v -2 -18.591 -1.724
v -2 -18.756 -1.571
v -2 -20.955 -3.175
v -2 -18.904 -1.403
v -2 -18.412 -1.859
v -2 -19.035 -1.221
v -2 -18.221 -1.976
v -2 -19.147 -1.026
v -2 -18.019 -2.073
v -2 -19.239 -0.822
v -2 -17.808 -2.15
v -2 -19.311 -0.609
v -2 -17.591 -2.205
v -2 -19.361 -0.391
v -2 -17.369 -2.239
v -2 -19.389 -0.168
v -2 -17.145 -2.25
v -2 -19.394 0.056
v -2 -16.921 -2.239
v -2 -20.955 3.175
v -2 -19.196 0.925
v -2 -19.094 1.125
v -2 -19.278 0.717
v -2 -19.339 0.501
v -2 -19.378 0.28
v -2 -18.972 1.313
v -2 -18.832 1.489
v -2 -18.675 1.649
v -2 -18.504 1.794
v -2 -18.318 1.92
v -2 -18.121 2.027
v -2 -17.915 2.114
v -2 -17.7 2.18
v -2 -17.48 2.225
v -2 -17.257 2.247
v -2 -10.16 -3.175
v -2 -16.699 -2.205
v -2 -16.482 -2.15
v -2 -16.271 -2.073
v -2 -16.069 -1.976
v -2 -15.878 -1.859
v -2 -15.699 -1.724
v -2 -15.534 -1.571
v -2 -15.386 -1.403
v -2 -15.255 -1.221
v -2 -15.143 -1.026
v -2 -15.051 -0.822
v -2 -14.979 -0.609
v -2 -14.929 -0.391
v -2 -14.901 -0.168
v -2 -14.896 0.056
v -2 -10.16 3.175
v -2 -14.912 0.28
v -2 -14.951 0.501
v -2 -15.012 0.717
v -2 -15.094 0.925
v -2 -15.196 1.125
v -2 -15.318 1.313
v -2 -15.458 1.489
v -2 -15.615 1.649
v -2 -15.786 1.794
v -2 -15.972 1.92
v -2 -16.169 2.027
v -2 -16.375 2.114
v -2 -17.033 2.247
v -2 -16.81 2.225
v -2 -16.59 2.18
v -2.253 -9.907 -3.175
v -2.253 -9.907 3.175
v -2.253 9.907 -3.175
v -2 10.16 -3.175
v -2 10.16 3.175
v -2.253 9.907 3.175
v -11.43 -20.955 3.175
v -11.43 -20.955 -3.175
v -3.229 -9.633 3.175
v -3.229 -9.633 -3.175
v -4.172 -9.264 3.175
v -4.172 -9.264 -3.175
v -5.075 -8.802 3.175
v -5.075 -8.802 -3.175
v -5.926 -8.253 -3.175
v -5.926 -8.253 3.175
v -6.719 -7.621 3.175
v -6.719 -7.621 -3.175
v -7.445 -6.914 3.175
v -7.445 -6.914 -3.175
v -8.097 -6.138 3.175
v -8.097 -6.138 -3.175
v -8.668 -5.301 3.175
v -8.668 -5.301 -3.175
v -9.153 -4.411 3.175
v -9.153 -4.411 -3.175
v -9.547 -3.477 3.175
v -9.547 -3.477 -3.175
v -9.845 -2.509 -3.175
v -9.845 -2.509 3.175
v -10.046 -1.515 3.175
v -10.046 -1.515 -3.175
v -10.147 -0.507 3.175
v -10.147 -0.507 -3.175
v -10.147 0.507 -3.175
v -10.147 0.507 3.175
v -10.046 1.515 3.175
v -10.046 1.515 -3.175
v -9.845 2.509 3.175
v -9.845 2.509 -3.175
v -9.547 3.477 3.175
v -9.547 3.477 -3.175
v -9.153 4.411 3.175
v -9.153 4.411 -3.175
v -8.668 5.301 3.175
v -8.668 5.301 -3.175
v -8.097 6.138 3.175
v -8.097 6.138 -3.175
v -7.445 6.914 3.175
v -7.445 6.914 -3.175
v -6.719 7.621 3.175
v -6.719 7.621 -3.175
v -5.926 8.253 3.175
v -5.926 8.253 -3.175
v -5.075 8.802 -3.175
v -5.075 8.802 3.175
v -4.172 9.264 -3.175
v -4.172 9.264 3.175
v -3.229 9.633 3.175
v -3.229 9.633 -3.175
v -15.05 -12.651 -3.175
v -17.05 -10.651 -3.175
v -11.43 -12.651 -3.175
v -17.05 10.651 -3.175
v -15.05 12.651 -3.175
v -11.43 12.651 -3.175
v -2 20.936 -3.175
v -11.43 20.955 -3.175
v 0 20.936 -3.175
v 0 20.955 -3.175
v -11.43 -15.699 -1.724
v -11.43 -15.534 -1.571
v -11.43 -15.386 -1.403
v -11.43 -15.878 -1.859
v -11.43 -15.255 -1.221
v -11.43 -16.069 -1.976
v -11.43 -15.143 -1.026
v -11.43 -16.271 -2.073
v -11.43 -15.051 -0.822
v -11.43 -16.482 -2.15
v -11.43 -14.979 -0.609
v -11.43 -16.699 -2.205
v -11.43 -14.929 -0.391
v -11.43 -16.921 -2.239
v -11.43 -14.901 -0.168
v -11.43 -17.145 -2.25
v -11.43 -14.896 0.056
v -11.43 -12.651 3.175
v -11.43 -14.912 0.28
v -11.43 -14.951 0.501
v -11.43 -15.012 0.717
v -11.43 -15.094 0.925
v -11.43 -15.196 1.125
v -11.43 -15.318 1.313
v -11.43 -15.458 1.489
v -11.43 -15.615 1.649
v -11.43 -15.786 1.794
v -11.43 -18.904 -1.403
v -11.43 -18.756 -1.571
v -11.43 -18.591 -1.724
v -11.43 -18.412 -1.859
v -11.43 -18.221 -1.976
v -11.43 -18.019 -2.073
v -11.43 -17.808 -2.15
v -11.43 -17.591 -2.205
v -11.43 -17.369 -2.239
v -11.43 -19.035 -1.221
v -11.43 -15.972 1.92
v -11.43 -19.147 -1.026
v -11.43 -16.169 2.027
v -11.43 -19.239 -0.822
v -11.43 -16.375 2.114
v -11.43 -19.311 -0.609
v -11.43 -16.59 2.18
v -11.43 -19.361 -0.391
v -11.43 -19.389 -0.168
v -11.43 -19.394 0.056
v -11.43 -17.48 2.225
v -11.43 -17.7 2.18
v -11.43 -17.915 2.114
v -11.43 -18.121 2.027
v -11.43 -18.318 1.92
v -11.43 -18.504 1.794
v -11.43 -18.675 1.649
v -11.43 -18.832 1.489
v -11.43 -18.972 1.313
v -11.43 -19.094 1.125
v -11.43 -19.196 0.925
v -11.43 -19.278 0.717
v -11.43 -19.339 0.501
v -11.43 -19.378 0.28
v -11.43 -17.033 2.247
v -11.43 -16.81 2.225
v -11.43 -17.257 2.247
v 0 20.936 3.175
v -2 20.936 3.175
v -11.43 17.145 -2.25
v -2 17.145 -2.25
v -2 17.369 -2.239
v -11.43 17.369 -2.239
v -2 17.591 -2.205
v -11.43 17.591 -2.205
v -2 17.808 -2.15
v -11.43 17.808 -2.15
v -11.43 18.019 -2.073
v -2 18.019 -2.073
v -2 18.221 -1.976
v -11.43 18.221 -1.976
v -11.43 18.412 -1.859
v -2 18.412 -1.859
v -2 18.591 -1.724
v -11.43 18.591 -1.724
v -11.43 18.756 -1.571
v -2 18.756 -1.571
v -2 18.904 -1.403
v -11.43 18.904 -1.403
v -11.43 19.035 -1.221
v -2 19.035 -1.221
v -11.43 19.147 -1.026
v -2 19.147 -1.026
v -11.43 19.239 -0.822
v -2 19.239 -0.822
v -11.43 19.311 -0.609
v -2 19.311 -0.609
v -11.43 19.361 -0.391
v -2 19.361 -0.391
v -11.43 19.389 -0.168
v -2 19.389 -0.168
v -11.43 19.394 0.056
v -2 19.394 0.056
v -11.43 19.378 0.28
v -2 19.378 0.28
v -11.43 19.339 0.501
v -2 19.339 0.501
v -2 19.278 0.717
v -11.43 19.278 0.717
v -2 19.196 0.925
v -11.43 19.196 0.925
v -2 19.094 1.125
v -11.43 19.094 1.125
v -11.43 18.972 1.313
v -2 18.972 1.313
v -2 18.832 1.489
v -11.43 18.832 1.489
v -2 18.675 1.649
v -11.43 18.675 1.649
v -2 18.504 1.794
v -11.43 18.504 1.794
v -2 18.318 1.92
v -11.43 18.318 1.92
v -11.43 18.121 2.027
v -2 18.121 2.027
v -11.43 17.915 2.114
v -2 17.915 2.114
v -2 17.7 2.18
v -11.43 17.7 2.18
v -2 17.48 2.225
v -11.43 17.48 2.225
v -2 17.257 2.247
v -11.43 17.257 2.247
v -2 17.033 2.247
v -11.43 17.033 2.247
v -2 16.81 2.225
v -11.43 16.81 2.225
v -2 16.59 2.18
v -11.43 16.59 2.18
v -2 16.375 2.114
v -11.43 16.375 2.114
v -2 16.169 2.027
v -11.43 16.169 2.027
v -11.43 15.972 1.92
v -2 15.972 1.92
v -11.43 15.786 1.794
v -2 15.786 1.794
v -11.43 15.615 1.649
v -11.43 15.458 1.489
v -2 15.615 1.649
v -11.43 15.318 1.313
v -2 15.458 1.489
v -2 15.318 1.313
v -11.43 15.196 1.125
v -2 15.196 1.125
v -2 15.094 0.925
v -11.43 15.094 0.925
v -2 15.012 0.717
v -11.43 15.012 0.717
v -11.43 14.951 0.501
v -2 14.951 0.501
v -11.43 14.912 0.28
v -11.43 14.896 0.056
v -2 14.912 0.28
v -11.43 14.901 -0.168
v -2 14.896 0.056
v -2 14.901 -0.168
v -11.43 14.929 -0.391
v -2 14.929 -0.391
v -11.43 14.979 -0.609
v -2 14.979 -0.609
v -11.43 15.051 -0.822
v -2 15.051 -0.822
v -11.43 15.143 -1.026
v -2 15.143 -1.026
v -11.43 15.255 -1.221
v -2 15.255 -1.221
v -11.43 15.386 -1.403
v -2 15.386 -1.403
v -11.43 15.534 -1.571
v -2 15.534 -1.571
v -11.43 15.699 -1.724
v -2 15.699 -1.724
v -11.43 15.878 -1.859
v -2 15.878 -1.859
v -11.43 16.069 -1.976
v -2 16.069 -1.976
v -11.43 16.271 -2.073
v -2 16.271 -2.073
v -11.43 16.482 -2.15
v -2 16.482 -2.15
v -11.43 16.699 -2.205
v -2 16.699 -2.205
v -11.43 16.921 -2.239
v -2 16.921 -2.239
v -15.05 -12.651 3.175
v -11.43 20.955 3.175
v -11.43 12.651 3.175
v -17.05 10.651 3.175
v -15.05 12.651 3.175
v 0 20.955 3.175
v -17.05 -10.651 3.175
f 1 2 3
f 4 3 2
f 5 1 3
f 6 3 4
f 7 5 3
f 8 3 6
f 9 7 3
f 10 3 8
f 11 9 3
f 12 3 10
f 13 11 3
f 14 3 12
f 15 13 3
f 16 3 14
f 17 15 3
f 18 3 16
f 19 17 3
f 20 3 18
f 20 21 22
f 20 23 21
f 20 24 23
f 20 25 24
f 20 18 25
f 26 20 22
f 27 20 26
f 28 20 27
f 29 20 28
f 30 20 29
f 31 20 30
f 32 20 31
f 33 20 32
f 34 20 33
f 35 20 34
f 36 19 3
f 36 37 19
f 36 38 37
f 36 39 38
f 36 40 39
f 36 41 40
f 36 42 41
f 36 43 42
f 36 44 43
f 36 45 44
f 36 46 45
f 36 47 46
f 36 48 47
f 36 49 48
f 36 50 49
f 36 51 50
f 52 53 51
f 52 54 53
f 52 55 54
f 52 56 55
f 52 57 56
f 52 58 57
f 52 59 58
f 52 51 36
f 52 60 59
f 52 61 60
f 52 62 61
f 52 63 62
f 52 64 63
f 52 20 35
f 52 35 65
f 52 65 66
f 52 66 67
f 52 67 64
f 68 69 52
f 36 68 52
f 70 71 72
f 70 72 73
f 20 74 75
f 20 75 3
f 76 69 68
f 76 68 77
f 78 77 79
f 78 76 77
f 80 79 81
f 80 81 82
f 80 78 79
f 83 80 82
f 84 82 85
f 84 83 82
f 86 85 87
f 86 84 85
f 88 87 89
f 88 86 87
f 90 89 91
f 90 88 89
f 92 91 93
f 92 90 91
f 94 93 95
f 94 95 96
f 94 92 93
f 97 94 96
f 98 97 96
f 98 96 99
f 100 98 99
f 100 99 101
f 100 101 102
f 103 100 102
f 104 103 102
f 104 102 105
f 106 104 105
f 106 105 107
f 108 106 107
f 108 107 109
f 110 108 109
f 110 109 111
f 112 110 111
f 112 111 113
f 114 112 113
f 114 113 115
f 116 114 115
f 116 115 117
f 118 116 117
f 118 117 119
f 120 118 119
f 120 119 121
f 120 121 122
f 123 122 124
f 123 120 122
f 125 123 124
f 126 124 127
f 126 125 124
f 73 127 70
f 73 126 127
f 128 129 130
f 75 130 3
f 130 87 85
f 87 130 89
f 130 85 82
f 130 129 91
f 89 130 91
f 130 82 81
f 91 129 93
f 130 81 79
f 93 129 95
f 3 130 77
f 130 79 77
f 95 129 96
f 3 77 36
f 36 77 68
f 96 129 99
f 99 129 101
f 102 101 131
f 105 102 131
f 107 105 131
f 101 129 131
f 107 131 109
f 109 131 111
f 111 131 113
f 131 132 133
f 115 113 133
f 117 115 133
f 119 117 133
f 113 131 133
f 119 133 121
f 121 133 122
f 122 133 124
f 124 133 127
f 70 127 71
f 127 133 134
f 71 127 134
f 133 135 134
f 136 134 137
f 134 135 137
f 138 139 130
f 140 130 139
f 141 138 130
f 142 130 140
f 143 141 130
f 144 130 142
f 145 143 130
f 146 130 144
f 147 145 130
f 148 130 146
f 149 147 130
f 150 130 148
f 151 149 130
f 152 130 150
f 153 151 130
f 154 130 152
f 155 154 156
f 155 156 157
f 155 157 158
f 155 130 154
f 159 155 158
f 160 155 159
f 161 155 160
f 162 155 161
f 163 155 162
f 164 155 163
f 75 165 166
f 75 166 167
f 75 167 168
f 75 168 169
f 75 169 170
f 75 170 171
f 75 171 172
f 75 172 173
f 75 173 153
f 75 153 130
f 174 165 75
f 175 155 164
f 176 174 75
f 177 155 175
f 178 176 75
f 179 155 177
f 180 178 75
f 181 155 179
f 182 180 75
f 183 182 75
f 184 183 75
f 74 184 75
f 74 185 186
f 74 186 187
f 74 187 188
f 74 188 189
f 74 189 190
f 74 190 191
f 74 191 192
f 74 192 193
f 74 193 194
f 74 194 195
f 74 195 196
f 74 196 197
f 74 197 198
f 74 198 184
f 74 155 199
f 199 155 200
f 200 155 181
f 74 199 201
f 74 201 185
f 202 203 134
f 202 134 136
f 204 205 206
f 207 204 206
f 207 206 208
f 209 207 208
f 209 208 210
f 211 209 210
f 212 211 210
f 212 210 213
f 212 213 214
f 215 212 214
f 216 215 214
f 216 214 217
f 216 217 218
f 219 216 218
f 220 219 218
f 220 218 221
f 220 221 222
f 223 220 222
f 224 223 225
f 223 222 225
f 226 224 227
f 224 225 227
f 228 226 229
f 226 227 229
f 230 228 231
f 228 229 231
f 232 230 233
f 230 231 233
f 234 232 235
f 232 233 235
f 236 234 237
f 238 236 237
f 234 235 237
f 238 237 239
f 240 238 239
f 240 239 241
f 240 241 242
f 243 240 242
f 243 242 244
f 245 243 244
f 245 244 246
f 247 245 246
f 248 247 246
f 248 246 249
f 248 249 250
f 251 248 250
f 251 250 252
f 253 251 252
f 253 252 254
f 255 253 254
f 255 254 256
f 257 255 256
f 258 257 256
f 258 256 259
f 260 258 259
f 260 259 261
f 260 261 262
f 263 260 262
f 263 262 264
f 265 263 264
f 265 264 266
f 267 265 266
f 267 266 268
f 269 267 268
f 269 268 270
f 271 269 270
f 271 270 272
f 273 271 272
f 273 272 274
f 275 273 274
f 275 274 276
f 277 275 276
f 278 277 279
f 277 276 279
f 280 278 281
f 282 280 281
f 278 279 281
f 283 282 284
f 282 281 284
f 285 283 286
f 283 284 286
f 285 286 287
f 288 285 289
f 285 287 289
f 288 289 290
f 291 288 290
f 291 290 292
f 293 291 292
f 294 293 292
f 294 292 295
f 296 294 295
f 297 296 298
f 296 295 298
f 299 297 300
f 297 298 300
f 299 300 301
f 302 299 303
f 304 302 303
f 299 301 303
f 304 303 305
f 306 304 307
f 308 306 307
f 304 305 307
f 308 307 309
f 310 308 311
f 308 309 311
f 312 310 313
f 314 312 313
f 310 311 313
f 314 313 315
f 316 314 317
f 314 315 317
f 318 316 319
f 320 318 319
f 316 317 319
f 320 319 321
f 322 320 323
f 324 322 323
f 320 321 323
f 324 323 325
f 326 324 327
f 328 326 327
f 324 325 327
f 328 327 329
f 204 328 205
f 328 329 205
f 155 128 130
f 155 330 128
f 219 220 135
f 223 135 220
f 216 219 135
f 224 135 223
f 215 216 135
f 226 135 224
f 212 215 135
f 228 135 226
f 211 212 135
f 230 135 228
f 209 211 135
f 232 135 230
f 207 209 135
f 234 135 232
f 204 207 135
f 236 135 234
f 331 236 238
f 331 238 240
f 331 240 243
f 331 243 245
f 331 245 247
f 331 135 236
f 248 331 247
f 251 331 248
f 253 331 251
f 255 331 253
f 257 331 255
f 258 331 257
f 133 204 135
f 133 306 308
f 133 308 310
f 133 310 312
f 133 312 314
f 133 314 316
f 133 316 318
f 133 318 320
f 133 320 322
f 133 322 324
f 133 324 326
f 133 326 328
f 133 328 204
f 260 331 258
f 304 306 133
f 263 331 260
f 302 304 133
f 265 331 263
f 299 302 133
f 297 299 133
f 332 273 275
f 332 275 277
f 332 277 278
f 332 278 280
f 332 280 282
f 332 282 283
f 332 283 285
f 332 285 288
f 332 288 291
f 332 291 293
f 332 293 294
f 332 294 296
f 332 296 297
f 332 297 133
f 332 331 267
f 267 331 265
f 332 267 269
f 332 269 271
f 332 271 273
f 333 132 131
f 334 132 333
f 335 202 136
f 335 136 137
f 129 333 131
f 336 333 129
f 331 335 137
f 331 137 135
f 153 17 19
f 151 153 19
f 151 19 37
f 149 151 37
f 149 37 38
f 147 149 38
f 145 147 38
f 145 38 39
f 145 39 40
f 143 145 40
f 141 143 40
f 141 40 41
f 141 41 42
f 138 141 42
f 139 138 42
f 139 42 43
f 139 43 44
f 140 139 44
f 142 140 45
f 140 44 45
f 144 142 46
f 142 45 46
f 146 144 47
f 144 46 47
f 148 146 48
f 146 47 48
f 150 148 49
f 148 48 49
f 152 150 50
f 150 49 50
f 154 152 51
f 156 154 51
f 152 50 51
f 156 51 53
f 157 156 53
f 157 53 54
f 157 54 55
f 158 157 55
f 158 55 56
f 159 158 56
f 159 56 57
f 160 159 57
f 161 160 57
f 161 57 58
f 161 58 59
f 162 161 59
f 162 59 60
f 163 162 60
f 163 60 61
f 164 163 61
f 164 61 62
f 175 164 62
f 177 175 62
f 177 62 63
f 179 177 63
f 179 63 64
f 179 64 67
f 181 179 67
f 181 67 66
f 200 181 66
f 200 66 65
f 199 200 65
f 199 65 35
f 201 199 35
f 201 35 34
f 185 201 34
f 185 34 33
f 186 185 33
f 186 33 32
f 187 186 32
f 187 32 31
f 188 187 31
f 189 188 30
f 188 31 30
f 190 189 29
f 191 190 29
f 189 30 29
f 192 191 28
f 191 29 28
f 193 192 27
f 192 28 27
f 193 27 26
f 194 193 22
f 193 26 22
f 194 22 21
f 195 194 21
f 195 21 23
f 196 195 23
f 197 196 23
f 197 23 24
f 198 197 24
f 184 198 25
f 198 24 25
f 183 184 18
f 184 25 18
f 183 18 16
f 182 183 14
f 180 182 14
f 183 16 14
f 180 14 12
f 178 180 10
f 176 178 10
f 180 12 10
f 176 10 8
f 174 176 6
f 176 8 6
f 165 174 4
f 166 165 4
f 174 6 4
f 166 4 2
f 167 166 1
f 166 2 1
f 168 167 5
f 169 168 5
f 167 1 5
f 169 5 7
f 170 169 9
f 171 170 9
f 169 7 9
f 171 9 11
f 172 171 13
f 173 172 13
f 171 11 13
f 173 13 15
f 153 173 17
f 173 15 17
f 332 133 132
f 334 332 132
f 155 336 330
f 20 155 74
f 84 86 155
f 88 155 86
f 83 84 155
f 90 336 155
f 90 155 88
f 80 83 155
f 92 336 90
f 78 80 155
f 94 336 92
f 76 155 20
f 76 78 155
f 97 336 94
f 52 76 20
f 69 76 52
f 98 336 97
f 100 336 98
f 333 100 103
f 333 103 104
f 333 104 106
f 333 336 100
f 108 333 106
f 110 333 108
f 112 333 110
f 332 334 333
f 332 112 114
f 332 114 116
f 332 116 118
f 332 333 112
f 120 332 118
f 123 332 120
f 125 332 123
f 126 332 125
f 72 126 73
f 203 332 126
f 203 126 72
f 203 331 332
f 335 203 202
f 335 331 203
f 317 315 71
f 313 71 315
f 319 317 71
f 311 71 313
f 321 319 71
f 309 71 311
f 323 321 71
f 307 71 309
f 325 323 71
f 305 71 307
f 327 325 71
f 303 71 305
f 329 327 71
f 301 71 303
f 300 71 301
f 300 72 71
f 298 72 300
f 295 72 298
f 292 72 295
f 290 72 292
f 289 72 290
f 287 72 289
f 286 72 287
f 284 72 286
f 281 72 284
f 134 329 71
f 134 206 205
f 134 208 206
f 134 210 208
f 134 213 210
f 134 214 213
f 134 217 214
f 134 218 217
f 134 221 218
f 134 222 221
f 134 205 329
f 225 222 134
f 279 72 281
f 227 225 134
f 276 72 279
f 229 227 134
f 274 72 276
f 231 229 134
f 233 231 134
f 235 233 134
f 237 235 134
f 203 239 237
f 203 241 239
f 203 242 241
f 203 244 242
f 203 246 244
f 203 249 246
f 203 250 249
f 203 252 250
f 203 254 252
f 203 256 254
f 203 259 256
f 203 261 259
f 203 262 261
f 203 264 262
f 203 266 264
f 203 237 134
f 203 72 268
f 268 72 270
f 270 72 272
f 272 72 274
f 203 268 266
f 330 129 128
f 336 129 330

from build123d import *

# Parameters (mm, degrees)
BOSS_EXTRUDE2_DEPTH  = 3.175
CHAMFER2_SIZE        = 2
M4_CLEARANCE_HOLE1_D = 4.5
CHAMFER1_SIZE        = 2
SKETCH6_W            = 2
SKETCH6_H            = 41.891167458
CUT_EXTRUDE1_DEPTH   = 28.75134276


with BuildPart() as part:
    # Sketch1 → Boss-Extrude2 (new, symmetric)
    with BuildSketch(Plane.XY):
        with BuildLine():
            Line((0, 10.16), (0, 20.955))
            Line((0, 20.955), (-11.43, 20.955))
            Line((-11.43, 20.955), (-11.43, 12.651387276))
            Line((-11.43, 12.651387276), (-17.05, 12.651387276))
            Line((-17.05, 12.651387276), (-17.05, -12.651387276))
            Line((-17.05, -12.651387276), (-11.43, -12.651387276))
            Line((-11.43, -12.651387276), (-11.43, -20.955))
            Line((-11.43, -20.955), (0, -20.955))
            Line((0, -20.955), (0, -10.16))
            ThreePointArc((0, -10.16), (-10.16, 0), (0, 10.16))
        make_face()
    extrude(amount=BOSS_EXTRUDE2_DEPTH, both=True)

    # Chamfer2
    chamfer2_edges = [part.edges().sort_by_distance(p)[0] for p in [
        (-17.05, -12.651387276, 0),
        (-17.05, 12.651387276, 0),
    ]]
    chamfer(chamfer2_edges, length=CHAMFER2_SIZE)

    # M4 Clearance Hole1 (through all)
    with Locations(Plane.ZY.offset(17.05)):
        with Locations((0, 17.145), (0, -17.145)):
            Hole(M4_CLEARANCE_HOLE1_D / 2)

    # Chamfer1
    # the kernel refuses this chamfer: 2 mm, written as the material it takes off along each edge
    with BuildSketch(Plane(origin=(0, -10.16, 9.000384751), x_dir=(-0.9937566306409056, 0.1115695256655456, 0), z_dir=(0, 0, -1))) as chamfer1_piece_1:
        with BuildLine():
            Line((2.267092762, 0), (-CHAMFER1_SIZE * 0.111569525666, -CHAMFER1_SIZE * 0.993756630641))
            Line((-CHAMFER1_SIZE * 0.111569525666, -CHAMFER1_SIZE * 0.993756630641), (0, 0))
            ThreePointArc((0, 0), (1.165083929, -0.063383685), (2.267092762, 0))
        make_face()
    extrude(amount=18.000769503, mode=Mode.SUBTRACT)
    with BuildSketch(Plane(origin=(0, 10.16, 9.000384751), x_dir=(0, 1, 0), z_dir=(0, 0, -1))) as chamfer1_piece_2:
        with BuildLine():
            Line((CHAMFER1_SIZE, 0), (-0.252938464, -2.252938464))
            ThreePointArc((-0.252938464, -2.252938464), (-0.066999904, -1.164881567), (0, 0))
            Line((0, 0), (CHAMFER1_SIZE, 0))
        make_face()
    extrude(amount=18.000769503, mode=Mode.SUBTRACT)

    # Sketch6 → Cut-Extrude1 (cut, through all)
    with BuildSketch(Plane.XY.offset(3.175)):
        with Locations((-1, -0.009416271)):
            Rectangle(SKETCH6_W, SKETCH6_H)
    extrude(amount=-CUT_EXTRUDE1_DEPTH, mode=Mode.SUBTRACT)


solid = part.part
